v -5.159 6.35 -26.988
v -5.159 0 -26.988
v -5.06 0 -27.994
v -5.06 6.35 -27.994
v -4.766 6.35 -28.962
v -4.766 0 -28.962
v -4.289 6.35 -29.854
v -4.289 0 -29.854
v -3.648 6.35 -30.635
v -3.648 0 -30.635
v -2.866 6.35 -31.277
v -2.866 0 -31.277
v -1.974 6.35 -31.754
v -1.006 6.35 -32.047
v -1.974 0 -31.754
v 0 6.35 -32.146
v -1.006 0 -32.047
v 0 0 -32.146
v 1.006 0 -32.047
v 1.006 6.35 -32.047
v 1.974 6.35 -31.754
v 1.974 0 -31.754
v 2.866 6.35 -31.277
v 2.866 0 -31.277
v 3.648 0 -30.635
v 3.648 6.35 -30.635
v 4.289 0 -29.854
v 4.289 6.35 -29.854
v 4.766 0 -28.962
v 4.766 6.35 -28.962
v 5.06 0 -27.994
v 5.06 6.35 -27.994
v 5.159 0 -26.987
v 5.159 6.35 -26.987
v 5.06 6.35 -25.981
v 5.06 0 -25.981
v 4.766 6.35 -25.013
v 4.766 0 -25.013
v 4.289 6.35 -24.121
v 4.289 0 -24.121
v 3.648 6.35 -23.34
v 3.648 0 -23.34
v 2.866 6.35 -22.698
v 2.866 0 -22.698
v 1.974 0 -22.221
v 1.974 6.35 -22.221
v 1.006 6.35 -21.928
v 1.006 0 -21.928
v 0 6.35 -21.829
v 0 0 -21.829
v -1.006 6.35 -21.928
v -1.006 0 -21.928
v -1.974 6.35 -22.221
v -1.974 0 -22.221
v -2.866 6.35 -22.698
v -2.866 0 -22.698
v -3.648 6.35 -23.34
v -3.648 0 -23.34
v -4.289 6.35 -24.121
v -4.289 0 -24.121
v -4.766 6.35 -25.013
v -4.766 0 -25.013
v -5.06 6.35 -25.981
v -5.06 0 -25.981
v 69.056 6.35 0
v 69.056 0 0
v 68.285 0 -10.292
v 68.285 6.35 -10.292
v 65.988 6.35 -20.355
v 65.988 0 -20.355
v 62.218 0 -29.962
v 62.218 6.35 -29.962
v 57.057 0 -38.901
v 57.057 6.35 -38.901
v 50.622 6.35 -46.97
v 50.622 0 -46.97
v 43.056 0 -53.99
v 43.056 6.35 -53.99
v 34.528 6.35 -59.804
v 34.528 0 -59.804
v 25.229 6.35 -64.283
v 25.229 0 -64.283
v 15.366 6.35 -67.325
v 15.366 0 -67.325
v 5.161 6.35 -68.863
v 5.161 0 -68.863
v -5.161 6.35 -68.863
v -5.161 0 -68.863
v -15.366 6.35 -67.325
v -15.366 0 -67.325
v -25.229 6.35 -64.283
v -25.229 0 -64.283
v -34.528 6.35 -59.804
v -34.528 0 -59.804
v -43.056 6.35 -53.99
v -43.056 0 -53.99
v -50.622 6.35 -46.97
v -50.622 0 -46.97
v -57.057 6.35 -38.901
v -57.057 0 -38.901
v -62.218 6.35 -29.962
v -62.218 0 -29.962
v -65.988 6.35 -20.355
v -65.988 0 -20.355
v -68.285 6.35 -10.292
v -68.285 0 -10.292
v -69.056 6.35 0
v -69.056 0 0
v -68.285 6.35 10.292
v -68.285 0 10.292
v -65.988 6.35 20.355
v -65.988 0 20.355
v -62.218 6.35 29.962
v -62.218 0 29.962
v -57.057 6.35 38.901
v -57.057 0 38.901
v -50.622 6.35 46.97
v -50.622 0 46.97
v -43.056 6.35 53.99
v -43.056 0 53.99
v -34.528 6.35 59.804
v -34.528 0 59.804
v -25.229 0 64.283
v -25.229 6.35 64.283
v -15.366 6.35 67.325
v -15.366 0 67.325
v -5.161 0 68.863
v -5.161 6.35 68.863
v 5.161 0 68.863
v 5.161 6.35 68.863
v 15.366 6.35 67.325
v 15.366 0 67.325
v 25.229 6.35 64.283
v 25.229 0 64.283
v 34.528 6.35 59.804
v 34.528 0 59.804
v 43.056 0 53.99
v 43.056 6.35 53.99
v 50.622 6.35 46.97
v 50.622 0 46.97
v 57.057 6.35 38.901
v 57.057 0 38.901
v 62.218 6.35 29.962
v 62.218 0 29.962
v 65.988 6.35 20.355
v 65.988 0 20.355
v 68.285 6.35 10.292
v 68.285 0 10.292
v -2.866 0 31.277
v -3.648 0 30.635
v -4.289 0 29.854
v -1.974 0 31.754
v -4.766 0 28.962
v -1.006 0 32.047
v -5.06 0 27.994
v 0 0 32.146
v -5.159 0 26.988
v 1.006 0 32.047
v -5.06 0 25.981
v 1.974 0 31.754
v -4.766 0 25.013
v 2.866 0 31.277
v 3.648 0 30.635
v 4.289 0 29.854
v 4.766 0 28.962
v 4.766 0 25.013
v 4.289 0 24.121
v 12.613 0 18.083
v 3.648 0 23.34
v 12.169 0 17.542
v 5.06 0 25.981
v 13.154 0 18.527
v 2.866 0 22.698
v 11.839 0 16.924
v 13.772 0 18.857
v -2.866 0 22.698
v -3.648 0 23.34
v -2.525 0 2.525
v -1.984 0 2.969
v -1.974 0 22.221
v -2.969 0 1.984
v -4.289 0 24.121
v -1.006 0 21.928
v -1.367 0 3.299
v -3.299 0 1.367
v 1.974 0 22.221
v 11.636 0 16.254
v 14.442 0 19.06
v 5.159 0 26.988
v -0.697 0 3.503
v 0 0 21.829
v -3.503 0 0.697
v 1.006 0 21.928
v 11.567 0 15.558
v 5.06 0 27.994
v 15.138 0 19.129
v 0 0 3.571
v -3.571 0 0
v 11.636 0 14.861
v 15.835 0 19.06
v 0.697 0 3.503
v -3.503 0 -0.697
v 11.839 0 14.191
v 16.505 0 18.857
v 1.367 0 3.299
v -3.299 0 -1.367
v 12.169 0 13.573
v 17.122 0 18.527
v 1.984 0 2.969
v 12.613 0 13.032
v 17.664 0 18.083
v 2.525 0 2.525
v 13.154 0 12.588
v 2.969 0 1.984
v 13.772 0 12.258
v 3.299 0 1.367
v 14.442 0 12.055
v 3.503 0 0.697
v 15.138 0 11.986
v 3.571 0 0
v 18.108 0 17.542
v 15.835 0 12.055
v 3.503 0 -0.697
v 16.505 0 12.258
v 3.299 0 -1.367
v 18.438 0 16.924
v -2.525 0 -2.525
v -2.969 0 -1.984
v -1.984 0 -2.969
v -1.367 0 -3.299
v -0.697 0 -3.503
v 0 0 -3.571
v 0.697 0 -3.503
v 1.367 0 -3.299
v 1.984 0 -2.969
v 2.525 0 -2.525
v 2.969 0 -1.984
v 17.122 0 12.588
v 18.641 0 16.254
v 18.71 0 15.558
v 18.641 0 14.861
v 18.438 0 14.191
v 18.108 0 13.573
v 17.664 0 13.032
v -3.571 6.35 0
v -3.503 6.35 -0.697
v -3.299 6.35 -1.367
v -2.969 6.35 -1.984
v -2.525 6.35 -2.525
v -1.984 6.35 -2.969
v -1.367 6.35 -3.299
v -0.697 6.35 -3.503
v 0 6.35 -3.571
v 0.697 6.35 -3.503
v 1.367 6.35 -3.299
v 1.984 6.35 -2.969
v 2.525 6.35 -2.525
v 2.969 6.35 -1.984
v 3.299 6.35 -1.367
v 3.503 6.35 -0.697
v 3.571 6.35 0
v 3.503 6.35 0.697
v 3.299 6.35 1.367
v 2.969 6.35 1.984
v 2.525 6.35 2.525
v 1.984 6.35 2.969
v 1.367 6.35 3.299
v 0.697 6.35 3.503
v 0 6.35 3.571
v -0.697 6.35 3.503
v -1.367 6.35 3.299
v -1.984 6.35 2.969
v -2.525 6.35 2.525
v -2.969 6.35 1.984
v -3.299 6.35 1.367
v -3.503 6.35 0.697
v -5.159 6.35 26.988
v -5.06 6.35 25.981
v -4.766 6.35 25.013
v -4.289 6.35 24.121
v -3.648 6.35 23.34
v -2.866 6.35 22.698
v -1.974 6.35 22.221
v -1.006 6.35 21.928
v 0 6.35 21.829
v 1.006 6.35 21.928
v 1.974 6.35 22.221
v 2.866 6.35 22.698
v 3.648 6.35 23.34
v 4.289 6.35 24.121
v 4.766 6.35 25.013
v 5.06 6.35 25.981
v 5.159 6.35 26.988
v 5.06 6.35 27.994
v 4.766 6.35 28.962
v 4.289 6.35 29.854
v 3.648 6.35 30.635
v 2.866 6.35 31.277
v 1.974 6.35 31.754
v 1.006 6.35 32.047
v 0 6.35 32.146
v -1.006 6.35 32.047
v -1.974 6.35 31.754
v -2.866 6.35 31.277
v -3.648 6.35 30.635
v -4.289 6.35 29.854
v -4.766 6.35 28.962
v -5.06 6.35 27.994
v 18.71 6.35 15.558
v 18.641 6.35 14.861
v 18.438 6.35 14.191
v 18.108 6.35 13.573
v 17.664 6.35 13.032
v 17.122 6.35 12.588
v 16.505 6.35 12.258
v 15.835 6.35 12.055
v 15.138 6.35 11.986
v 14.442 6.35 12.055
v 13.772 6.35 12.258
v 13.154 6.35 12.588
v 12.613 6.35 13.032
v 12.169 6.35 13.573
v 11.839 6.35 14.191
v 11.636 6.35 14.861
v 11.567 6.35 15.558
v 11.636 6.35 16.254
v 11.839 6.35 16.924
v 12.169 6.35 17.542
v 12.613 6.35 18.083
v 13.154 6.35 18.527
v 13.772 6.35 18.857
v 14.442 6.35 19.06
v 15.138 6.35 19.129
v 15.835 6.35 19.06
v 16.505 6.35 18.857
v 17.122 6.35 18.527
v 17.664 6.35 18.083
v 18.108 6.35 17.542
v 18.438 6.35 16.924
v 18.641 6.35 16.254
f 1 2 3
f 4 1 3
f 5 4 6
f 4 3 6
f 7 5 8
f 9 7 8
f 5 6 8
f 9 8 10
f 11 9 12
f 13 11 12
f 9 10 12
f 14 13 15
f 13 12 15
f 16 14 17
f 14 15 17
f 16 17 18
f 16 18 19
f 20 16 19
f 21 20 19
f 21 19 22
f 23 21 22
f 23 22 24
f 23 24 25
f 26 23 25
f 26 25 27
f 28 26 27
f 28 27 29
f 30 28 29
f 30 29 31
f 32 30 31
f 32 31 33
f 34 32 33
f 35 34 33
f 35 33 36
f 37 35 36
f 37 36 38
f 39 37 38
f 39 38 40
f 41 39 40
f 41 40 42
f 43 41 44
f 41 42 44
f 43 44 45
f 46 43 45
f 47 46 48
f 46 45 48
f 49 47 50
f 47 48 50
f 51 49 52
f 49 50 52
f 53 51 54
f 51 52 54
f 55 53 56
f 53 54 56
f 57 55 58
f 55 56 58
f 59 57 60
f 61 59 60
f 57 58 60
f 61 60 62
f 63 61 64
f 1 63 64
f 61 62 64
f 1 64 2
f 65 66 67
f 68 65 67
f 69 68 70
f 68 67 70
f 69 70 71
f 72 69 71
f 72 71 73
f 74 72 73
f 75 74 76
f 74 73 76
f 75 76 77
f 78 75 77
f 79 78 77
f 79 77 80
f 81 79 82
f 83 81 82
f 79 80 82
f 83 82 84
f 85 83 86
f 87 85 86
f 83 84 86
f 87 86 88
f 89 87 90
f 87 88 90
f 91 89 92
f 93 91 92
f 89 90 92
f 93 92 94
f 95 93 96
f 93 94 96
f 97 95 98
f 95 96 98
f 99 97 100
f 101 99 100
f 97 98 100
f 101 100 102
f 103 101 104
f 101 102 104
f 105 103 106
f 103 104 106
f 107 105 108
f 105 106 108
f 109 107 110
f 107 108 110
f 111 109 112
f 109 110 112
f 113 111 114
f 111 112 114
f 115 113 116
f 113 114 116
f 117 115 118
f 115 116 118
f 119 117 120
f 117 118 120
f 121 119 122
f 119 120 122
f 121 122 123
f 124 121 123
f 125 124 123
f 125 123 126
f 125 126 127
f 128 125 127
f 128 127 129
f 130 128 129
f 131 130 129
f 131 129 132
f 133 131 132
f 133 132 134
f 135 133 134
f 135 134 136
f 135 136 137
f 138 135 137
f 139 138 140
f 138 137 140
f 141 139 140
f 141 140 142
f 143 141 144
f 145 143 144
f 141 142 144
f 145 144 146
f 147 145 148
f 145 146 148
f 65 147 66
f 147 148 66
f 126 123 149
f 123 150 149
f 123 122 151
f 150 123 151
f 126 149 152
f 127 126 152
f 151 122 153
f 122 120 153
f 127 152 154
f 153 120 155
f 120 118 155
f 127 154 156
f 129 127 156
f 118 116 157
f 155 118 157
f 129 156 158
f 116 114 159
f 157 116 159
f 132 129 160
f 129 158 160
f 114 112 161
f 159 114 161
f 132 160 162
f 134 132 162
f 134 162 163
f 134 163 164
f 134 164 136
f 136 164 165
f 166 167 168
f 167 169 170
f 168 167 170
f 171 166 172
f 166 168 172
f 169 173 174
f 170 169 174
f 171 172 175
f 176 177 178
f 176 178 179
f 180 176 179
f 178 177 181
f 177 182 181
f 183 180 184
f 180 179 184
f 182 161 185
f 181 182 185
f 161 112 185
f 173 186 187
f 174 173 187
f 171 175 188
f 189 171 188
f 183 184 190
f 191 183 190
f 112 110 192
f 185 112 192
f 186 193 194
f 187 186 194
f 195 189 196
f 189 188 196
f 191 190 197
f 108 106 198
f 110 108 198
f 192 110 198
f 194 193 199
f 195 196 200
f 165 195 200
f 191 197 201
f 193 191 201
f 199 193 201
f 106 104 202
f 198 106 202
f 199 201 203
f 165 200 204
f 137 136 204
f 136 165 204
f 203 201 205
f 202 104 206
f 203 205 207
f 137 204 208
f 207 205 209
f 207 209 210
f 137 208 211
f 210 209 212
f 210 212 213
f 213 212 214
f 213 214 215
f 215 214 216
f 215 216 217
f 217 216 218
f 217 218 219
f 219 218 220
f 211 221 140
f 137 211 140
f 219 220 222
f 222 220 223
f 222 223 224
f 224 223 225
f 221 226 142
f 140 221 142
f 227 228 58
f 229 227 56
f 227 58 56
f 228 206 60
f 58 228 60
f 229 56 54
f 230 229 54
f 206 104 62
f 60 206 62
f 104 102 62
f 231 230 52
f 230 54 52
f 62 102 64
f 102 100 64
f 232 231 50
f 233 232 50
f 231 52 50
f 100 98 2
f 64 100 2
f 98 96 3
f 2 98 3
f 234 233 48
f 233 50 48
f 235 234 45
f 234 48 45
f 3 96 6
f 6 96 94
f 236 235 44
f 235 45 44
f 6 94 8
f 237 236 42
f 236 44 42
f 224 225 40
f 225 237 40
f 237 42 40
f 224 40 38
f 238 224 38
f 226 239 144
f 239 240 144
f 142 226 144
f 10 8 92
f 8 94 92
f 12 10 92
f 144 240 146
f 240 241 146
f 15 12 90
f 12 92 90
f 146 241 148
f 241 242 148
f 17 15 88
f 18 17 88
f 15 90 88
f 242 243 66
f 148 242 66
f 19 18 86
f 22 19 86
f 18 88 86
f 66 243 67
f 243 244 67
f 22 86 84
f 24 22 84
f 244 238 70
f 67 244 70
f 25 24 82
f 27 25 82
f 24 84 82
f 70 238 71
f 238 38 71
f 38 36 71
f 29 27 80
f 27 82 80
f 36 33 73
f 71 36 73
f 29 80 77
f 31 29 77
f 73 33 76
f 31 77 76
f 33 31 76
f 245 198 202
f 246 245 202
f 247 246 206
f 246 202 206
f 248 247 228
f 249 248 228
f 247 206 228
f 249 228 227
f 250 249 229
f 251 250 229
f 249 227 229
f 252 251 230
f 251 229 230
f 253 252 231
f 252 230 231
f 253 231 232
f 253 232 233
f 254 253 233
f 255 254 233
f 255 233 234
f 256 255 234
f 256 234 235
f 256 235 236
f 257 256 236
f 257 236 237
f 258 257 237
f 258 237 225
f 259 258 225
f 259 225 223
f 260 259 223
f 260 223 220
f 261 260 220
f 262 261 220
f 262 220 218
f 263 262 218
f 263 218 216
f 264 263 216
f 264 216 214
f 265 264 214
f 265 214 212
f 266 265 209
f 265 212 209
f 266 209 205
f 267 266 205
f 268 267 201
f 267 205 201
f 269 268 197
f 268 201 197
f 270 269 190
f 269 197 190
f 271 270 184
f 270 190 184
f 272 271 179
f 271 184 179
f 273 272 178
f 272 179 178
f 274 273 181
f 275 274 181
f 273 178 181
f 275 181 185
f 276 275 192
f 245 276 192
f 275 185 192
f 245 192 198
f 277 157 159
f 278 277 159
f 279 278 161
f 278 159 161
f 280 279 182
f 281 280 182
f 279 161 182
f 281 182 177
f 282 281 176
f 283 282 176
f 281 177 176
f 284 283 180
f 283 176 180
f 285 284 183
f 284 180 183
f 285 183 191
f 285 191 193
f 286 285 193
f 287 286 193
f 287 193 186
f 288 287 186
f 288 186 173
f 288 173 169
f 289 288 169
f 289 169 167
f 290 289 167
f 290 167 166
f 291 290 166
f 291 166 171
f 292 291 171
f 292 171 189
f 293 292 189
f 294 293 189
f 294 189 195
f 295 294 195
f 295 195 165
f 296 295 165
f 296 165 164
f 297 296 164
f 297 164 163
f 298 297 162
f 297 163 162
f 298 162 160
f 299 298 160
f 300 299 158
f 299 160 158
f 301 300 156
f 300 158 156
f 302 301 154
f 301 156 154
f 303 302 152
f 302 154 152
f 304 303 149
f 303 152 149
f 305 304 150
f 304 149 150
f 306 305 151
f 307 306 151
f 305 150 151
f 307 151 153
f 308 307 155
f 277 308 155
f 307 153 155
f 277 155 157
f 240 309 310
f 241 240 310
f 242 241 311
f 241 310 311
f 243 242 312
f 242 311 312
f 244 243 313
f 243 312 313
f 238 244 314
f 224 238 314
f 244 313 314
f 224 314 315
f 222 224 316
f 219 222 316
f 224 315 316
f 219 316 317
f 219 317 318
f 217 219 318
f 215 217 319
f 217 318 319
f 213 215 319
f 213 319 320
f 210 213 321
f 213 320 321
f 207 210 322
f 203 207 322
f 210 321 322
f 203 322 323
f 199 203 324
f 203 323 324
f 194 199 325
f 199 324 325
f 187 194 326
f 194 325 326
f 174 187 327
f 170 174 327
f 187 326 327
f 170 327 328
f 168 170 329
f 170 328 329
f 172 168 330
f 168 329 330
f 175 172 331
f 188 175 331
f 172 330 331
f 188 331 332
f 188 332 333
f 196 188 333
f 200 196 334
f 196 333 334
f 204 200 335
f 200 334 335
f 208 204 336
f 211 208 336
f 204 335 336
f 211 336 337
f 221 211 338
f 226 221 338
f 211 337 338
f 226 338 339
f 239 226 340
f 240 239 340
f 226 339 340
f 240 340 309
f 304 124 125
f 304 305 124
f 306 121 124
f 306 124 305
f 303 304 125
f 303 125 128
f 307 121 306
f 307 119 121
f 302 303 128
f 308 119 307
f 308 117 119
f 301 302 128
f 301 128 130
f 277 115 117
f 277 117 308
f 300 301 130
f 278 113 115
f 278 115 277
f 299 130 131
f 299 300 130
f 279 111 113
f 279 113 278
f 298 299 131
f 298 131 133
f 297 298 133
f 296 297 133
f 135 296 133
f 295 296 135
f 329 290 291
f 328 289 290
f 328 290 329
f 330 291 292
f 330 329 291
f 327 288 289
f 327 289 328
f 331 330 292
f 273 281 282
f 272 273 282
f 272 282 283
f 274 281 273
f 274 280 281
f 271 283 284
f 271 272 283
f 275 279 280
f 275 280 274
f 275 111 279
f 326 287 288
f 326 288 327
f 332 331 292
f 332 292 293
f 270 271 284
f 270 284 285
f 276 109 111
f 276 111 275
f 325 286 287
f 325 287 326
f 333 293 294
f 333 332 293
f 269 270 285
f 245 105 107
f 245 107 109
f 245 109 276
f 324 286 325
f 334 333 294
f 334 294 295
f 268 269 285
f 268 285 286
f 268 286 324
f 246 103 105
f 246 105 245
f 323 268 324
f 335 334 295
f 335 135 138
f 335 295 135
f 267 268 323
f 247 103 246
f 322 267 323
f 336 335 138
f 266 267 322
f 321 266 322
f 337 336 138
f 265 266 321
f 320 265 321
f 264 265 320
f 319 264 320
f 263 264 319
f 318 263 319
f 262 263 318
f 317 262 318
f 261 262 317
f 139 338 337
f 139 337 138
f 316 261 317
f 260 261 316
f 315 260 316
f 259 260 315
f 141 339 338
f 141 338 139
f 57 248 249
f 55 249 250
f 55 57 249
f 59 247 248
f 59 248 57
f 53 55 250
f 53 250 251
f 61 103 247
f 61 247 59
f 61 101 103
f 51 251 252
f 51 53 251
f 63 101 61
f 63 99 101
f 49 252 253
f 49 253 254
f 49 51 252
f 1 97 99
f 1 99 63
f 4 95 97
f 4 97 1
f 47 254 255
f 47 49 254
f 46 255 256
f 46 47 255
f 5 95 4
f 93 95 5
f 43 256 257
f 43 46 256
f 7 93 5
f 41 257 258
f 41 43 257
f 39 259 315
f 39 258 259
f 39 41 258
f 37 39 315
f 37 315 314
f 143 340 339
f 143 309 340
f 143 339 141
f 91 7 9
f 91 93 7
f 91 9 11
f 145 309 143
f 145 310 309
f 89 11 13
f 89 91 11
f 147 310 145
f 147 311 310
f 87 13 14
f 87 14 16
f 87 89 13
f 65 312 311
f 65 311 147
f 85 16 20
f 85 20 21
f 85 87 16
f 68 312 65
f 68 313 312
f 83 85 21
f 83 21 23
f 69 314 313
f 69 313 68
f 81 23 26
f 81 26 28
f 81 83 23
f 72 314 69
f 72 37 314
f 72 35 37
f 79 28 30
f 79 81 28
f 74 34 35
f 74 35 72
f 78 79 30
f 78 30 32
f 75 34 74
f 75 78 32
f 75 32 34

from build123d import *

# Parameters (mm, degrees)
SKETCH1_R               = 69.05625
BOSS_EXTRUDE1_DEPTH     = 6.35
F_1_4_CLEARANCE_HOLE1_D = 7.14248
F_3_8_CLEARANCE_HOLE1_D = 10.31748
SKETCH6_R               = 3.57124
CUT_EXTRUDE1_DEPTH      = 6.35


with BuildPart() as part:
    # Sketch1 → Boss-Extrude1 (new body)
    with BuildSketch(Plane(origin=(0, 0, 0), x_dir=(1, 0, 0), z_dir=(0, 1, 0))):
        Circle(SKETCH1_R)
    extrude(amount=BOSS_EXTRUDE1_DEPTH)

    # 1/4 Clearance Hole1 (through all)
    with Locations(Plane(origin=(0, 6.35, 0), x_dir=(1, 0, 0), z_dir=(0, 1, 0))):
        with Locations((0, 0)):
            Hole(F_1_4_CLEARANCE_HOLE1_D / 2)

    # 3/8 Clearance Hole1 (through all)
    with Locations(Plane(origin=(0, 6.35, 0), x_dir=(1, 0, 0), z_dir=(0, 1, 0))):
        with Locations((0, 26.9875), (0, -26.9875)):
            Hole(F_3_8_CLEARANCE_HOLE1_D / 2)

    # Sketch6 → Cut-Extrude1 (cut)
    with BuildSketch(Plane(origin=(0, 6.35, 0), x_dir=(1, 0, 0), z_dir=(0, 1, 0))):
        with Locations((15.1384, -15.5575)):
            Circle(SKETCH6_R)
    extrude(amount=-CUT_EXTRUDE1_DEPTH, mode=Mode.SUBTRACT)


solid = part.part
